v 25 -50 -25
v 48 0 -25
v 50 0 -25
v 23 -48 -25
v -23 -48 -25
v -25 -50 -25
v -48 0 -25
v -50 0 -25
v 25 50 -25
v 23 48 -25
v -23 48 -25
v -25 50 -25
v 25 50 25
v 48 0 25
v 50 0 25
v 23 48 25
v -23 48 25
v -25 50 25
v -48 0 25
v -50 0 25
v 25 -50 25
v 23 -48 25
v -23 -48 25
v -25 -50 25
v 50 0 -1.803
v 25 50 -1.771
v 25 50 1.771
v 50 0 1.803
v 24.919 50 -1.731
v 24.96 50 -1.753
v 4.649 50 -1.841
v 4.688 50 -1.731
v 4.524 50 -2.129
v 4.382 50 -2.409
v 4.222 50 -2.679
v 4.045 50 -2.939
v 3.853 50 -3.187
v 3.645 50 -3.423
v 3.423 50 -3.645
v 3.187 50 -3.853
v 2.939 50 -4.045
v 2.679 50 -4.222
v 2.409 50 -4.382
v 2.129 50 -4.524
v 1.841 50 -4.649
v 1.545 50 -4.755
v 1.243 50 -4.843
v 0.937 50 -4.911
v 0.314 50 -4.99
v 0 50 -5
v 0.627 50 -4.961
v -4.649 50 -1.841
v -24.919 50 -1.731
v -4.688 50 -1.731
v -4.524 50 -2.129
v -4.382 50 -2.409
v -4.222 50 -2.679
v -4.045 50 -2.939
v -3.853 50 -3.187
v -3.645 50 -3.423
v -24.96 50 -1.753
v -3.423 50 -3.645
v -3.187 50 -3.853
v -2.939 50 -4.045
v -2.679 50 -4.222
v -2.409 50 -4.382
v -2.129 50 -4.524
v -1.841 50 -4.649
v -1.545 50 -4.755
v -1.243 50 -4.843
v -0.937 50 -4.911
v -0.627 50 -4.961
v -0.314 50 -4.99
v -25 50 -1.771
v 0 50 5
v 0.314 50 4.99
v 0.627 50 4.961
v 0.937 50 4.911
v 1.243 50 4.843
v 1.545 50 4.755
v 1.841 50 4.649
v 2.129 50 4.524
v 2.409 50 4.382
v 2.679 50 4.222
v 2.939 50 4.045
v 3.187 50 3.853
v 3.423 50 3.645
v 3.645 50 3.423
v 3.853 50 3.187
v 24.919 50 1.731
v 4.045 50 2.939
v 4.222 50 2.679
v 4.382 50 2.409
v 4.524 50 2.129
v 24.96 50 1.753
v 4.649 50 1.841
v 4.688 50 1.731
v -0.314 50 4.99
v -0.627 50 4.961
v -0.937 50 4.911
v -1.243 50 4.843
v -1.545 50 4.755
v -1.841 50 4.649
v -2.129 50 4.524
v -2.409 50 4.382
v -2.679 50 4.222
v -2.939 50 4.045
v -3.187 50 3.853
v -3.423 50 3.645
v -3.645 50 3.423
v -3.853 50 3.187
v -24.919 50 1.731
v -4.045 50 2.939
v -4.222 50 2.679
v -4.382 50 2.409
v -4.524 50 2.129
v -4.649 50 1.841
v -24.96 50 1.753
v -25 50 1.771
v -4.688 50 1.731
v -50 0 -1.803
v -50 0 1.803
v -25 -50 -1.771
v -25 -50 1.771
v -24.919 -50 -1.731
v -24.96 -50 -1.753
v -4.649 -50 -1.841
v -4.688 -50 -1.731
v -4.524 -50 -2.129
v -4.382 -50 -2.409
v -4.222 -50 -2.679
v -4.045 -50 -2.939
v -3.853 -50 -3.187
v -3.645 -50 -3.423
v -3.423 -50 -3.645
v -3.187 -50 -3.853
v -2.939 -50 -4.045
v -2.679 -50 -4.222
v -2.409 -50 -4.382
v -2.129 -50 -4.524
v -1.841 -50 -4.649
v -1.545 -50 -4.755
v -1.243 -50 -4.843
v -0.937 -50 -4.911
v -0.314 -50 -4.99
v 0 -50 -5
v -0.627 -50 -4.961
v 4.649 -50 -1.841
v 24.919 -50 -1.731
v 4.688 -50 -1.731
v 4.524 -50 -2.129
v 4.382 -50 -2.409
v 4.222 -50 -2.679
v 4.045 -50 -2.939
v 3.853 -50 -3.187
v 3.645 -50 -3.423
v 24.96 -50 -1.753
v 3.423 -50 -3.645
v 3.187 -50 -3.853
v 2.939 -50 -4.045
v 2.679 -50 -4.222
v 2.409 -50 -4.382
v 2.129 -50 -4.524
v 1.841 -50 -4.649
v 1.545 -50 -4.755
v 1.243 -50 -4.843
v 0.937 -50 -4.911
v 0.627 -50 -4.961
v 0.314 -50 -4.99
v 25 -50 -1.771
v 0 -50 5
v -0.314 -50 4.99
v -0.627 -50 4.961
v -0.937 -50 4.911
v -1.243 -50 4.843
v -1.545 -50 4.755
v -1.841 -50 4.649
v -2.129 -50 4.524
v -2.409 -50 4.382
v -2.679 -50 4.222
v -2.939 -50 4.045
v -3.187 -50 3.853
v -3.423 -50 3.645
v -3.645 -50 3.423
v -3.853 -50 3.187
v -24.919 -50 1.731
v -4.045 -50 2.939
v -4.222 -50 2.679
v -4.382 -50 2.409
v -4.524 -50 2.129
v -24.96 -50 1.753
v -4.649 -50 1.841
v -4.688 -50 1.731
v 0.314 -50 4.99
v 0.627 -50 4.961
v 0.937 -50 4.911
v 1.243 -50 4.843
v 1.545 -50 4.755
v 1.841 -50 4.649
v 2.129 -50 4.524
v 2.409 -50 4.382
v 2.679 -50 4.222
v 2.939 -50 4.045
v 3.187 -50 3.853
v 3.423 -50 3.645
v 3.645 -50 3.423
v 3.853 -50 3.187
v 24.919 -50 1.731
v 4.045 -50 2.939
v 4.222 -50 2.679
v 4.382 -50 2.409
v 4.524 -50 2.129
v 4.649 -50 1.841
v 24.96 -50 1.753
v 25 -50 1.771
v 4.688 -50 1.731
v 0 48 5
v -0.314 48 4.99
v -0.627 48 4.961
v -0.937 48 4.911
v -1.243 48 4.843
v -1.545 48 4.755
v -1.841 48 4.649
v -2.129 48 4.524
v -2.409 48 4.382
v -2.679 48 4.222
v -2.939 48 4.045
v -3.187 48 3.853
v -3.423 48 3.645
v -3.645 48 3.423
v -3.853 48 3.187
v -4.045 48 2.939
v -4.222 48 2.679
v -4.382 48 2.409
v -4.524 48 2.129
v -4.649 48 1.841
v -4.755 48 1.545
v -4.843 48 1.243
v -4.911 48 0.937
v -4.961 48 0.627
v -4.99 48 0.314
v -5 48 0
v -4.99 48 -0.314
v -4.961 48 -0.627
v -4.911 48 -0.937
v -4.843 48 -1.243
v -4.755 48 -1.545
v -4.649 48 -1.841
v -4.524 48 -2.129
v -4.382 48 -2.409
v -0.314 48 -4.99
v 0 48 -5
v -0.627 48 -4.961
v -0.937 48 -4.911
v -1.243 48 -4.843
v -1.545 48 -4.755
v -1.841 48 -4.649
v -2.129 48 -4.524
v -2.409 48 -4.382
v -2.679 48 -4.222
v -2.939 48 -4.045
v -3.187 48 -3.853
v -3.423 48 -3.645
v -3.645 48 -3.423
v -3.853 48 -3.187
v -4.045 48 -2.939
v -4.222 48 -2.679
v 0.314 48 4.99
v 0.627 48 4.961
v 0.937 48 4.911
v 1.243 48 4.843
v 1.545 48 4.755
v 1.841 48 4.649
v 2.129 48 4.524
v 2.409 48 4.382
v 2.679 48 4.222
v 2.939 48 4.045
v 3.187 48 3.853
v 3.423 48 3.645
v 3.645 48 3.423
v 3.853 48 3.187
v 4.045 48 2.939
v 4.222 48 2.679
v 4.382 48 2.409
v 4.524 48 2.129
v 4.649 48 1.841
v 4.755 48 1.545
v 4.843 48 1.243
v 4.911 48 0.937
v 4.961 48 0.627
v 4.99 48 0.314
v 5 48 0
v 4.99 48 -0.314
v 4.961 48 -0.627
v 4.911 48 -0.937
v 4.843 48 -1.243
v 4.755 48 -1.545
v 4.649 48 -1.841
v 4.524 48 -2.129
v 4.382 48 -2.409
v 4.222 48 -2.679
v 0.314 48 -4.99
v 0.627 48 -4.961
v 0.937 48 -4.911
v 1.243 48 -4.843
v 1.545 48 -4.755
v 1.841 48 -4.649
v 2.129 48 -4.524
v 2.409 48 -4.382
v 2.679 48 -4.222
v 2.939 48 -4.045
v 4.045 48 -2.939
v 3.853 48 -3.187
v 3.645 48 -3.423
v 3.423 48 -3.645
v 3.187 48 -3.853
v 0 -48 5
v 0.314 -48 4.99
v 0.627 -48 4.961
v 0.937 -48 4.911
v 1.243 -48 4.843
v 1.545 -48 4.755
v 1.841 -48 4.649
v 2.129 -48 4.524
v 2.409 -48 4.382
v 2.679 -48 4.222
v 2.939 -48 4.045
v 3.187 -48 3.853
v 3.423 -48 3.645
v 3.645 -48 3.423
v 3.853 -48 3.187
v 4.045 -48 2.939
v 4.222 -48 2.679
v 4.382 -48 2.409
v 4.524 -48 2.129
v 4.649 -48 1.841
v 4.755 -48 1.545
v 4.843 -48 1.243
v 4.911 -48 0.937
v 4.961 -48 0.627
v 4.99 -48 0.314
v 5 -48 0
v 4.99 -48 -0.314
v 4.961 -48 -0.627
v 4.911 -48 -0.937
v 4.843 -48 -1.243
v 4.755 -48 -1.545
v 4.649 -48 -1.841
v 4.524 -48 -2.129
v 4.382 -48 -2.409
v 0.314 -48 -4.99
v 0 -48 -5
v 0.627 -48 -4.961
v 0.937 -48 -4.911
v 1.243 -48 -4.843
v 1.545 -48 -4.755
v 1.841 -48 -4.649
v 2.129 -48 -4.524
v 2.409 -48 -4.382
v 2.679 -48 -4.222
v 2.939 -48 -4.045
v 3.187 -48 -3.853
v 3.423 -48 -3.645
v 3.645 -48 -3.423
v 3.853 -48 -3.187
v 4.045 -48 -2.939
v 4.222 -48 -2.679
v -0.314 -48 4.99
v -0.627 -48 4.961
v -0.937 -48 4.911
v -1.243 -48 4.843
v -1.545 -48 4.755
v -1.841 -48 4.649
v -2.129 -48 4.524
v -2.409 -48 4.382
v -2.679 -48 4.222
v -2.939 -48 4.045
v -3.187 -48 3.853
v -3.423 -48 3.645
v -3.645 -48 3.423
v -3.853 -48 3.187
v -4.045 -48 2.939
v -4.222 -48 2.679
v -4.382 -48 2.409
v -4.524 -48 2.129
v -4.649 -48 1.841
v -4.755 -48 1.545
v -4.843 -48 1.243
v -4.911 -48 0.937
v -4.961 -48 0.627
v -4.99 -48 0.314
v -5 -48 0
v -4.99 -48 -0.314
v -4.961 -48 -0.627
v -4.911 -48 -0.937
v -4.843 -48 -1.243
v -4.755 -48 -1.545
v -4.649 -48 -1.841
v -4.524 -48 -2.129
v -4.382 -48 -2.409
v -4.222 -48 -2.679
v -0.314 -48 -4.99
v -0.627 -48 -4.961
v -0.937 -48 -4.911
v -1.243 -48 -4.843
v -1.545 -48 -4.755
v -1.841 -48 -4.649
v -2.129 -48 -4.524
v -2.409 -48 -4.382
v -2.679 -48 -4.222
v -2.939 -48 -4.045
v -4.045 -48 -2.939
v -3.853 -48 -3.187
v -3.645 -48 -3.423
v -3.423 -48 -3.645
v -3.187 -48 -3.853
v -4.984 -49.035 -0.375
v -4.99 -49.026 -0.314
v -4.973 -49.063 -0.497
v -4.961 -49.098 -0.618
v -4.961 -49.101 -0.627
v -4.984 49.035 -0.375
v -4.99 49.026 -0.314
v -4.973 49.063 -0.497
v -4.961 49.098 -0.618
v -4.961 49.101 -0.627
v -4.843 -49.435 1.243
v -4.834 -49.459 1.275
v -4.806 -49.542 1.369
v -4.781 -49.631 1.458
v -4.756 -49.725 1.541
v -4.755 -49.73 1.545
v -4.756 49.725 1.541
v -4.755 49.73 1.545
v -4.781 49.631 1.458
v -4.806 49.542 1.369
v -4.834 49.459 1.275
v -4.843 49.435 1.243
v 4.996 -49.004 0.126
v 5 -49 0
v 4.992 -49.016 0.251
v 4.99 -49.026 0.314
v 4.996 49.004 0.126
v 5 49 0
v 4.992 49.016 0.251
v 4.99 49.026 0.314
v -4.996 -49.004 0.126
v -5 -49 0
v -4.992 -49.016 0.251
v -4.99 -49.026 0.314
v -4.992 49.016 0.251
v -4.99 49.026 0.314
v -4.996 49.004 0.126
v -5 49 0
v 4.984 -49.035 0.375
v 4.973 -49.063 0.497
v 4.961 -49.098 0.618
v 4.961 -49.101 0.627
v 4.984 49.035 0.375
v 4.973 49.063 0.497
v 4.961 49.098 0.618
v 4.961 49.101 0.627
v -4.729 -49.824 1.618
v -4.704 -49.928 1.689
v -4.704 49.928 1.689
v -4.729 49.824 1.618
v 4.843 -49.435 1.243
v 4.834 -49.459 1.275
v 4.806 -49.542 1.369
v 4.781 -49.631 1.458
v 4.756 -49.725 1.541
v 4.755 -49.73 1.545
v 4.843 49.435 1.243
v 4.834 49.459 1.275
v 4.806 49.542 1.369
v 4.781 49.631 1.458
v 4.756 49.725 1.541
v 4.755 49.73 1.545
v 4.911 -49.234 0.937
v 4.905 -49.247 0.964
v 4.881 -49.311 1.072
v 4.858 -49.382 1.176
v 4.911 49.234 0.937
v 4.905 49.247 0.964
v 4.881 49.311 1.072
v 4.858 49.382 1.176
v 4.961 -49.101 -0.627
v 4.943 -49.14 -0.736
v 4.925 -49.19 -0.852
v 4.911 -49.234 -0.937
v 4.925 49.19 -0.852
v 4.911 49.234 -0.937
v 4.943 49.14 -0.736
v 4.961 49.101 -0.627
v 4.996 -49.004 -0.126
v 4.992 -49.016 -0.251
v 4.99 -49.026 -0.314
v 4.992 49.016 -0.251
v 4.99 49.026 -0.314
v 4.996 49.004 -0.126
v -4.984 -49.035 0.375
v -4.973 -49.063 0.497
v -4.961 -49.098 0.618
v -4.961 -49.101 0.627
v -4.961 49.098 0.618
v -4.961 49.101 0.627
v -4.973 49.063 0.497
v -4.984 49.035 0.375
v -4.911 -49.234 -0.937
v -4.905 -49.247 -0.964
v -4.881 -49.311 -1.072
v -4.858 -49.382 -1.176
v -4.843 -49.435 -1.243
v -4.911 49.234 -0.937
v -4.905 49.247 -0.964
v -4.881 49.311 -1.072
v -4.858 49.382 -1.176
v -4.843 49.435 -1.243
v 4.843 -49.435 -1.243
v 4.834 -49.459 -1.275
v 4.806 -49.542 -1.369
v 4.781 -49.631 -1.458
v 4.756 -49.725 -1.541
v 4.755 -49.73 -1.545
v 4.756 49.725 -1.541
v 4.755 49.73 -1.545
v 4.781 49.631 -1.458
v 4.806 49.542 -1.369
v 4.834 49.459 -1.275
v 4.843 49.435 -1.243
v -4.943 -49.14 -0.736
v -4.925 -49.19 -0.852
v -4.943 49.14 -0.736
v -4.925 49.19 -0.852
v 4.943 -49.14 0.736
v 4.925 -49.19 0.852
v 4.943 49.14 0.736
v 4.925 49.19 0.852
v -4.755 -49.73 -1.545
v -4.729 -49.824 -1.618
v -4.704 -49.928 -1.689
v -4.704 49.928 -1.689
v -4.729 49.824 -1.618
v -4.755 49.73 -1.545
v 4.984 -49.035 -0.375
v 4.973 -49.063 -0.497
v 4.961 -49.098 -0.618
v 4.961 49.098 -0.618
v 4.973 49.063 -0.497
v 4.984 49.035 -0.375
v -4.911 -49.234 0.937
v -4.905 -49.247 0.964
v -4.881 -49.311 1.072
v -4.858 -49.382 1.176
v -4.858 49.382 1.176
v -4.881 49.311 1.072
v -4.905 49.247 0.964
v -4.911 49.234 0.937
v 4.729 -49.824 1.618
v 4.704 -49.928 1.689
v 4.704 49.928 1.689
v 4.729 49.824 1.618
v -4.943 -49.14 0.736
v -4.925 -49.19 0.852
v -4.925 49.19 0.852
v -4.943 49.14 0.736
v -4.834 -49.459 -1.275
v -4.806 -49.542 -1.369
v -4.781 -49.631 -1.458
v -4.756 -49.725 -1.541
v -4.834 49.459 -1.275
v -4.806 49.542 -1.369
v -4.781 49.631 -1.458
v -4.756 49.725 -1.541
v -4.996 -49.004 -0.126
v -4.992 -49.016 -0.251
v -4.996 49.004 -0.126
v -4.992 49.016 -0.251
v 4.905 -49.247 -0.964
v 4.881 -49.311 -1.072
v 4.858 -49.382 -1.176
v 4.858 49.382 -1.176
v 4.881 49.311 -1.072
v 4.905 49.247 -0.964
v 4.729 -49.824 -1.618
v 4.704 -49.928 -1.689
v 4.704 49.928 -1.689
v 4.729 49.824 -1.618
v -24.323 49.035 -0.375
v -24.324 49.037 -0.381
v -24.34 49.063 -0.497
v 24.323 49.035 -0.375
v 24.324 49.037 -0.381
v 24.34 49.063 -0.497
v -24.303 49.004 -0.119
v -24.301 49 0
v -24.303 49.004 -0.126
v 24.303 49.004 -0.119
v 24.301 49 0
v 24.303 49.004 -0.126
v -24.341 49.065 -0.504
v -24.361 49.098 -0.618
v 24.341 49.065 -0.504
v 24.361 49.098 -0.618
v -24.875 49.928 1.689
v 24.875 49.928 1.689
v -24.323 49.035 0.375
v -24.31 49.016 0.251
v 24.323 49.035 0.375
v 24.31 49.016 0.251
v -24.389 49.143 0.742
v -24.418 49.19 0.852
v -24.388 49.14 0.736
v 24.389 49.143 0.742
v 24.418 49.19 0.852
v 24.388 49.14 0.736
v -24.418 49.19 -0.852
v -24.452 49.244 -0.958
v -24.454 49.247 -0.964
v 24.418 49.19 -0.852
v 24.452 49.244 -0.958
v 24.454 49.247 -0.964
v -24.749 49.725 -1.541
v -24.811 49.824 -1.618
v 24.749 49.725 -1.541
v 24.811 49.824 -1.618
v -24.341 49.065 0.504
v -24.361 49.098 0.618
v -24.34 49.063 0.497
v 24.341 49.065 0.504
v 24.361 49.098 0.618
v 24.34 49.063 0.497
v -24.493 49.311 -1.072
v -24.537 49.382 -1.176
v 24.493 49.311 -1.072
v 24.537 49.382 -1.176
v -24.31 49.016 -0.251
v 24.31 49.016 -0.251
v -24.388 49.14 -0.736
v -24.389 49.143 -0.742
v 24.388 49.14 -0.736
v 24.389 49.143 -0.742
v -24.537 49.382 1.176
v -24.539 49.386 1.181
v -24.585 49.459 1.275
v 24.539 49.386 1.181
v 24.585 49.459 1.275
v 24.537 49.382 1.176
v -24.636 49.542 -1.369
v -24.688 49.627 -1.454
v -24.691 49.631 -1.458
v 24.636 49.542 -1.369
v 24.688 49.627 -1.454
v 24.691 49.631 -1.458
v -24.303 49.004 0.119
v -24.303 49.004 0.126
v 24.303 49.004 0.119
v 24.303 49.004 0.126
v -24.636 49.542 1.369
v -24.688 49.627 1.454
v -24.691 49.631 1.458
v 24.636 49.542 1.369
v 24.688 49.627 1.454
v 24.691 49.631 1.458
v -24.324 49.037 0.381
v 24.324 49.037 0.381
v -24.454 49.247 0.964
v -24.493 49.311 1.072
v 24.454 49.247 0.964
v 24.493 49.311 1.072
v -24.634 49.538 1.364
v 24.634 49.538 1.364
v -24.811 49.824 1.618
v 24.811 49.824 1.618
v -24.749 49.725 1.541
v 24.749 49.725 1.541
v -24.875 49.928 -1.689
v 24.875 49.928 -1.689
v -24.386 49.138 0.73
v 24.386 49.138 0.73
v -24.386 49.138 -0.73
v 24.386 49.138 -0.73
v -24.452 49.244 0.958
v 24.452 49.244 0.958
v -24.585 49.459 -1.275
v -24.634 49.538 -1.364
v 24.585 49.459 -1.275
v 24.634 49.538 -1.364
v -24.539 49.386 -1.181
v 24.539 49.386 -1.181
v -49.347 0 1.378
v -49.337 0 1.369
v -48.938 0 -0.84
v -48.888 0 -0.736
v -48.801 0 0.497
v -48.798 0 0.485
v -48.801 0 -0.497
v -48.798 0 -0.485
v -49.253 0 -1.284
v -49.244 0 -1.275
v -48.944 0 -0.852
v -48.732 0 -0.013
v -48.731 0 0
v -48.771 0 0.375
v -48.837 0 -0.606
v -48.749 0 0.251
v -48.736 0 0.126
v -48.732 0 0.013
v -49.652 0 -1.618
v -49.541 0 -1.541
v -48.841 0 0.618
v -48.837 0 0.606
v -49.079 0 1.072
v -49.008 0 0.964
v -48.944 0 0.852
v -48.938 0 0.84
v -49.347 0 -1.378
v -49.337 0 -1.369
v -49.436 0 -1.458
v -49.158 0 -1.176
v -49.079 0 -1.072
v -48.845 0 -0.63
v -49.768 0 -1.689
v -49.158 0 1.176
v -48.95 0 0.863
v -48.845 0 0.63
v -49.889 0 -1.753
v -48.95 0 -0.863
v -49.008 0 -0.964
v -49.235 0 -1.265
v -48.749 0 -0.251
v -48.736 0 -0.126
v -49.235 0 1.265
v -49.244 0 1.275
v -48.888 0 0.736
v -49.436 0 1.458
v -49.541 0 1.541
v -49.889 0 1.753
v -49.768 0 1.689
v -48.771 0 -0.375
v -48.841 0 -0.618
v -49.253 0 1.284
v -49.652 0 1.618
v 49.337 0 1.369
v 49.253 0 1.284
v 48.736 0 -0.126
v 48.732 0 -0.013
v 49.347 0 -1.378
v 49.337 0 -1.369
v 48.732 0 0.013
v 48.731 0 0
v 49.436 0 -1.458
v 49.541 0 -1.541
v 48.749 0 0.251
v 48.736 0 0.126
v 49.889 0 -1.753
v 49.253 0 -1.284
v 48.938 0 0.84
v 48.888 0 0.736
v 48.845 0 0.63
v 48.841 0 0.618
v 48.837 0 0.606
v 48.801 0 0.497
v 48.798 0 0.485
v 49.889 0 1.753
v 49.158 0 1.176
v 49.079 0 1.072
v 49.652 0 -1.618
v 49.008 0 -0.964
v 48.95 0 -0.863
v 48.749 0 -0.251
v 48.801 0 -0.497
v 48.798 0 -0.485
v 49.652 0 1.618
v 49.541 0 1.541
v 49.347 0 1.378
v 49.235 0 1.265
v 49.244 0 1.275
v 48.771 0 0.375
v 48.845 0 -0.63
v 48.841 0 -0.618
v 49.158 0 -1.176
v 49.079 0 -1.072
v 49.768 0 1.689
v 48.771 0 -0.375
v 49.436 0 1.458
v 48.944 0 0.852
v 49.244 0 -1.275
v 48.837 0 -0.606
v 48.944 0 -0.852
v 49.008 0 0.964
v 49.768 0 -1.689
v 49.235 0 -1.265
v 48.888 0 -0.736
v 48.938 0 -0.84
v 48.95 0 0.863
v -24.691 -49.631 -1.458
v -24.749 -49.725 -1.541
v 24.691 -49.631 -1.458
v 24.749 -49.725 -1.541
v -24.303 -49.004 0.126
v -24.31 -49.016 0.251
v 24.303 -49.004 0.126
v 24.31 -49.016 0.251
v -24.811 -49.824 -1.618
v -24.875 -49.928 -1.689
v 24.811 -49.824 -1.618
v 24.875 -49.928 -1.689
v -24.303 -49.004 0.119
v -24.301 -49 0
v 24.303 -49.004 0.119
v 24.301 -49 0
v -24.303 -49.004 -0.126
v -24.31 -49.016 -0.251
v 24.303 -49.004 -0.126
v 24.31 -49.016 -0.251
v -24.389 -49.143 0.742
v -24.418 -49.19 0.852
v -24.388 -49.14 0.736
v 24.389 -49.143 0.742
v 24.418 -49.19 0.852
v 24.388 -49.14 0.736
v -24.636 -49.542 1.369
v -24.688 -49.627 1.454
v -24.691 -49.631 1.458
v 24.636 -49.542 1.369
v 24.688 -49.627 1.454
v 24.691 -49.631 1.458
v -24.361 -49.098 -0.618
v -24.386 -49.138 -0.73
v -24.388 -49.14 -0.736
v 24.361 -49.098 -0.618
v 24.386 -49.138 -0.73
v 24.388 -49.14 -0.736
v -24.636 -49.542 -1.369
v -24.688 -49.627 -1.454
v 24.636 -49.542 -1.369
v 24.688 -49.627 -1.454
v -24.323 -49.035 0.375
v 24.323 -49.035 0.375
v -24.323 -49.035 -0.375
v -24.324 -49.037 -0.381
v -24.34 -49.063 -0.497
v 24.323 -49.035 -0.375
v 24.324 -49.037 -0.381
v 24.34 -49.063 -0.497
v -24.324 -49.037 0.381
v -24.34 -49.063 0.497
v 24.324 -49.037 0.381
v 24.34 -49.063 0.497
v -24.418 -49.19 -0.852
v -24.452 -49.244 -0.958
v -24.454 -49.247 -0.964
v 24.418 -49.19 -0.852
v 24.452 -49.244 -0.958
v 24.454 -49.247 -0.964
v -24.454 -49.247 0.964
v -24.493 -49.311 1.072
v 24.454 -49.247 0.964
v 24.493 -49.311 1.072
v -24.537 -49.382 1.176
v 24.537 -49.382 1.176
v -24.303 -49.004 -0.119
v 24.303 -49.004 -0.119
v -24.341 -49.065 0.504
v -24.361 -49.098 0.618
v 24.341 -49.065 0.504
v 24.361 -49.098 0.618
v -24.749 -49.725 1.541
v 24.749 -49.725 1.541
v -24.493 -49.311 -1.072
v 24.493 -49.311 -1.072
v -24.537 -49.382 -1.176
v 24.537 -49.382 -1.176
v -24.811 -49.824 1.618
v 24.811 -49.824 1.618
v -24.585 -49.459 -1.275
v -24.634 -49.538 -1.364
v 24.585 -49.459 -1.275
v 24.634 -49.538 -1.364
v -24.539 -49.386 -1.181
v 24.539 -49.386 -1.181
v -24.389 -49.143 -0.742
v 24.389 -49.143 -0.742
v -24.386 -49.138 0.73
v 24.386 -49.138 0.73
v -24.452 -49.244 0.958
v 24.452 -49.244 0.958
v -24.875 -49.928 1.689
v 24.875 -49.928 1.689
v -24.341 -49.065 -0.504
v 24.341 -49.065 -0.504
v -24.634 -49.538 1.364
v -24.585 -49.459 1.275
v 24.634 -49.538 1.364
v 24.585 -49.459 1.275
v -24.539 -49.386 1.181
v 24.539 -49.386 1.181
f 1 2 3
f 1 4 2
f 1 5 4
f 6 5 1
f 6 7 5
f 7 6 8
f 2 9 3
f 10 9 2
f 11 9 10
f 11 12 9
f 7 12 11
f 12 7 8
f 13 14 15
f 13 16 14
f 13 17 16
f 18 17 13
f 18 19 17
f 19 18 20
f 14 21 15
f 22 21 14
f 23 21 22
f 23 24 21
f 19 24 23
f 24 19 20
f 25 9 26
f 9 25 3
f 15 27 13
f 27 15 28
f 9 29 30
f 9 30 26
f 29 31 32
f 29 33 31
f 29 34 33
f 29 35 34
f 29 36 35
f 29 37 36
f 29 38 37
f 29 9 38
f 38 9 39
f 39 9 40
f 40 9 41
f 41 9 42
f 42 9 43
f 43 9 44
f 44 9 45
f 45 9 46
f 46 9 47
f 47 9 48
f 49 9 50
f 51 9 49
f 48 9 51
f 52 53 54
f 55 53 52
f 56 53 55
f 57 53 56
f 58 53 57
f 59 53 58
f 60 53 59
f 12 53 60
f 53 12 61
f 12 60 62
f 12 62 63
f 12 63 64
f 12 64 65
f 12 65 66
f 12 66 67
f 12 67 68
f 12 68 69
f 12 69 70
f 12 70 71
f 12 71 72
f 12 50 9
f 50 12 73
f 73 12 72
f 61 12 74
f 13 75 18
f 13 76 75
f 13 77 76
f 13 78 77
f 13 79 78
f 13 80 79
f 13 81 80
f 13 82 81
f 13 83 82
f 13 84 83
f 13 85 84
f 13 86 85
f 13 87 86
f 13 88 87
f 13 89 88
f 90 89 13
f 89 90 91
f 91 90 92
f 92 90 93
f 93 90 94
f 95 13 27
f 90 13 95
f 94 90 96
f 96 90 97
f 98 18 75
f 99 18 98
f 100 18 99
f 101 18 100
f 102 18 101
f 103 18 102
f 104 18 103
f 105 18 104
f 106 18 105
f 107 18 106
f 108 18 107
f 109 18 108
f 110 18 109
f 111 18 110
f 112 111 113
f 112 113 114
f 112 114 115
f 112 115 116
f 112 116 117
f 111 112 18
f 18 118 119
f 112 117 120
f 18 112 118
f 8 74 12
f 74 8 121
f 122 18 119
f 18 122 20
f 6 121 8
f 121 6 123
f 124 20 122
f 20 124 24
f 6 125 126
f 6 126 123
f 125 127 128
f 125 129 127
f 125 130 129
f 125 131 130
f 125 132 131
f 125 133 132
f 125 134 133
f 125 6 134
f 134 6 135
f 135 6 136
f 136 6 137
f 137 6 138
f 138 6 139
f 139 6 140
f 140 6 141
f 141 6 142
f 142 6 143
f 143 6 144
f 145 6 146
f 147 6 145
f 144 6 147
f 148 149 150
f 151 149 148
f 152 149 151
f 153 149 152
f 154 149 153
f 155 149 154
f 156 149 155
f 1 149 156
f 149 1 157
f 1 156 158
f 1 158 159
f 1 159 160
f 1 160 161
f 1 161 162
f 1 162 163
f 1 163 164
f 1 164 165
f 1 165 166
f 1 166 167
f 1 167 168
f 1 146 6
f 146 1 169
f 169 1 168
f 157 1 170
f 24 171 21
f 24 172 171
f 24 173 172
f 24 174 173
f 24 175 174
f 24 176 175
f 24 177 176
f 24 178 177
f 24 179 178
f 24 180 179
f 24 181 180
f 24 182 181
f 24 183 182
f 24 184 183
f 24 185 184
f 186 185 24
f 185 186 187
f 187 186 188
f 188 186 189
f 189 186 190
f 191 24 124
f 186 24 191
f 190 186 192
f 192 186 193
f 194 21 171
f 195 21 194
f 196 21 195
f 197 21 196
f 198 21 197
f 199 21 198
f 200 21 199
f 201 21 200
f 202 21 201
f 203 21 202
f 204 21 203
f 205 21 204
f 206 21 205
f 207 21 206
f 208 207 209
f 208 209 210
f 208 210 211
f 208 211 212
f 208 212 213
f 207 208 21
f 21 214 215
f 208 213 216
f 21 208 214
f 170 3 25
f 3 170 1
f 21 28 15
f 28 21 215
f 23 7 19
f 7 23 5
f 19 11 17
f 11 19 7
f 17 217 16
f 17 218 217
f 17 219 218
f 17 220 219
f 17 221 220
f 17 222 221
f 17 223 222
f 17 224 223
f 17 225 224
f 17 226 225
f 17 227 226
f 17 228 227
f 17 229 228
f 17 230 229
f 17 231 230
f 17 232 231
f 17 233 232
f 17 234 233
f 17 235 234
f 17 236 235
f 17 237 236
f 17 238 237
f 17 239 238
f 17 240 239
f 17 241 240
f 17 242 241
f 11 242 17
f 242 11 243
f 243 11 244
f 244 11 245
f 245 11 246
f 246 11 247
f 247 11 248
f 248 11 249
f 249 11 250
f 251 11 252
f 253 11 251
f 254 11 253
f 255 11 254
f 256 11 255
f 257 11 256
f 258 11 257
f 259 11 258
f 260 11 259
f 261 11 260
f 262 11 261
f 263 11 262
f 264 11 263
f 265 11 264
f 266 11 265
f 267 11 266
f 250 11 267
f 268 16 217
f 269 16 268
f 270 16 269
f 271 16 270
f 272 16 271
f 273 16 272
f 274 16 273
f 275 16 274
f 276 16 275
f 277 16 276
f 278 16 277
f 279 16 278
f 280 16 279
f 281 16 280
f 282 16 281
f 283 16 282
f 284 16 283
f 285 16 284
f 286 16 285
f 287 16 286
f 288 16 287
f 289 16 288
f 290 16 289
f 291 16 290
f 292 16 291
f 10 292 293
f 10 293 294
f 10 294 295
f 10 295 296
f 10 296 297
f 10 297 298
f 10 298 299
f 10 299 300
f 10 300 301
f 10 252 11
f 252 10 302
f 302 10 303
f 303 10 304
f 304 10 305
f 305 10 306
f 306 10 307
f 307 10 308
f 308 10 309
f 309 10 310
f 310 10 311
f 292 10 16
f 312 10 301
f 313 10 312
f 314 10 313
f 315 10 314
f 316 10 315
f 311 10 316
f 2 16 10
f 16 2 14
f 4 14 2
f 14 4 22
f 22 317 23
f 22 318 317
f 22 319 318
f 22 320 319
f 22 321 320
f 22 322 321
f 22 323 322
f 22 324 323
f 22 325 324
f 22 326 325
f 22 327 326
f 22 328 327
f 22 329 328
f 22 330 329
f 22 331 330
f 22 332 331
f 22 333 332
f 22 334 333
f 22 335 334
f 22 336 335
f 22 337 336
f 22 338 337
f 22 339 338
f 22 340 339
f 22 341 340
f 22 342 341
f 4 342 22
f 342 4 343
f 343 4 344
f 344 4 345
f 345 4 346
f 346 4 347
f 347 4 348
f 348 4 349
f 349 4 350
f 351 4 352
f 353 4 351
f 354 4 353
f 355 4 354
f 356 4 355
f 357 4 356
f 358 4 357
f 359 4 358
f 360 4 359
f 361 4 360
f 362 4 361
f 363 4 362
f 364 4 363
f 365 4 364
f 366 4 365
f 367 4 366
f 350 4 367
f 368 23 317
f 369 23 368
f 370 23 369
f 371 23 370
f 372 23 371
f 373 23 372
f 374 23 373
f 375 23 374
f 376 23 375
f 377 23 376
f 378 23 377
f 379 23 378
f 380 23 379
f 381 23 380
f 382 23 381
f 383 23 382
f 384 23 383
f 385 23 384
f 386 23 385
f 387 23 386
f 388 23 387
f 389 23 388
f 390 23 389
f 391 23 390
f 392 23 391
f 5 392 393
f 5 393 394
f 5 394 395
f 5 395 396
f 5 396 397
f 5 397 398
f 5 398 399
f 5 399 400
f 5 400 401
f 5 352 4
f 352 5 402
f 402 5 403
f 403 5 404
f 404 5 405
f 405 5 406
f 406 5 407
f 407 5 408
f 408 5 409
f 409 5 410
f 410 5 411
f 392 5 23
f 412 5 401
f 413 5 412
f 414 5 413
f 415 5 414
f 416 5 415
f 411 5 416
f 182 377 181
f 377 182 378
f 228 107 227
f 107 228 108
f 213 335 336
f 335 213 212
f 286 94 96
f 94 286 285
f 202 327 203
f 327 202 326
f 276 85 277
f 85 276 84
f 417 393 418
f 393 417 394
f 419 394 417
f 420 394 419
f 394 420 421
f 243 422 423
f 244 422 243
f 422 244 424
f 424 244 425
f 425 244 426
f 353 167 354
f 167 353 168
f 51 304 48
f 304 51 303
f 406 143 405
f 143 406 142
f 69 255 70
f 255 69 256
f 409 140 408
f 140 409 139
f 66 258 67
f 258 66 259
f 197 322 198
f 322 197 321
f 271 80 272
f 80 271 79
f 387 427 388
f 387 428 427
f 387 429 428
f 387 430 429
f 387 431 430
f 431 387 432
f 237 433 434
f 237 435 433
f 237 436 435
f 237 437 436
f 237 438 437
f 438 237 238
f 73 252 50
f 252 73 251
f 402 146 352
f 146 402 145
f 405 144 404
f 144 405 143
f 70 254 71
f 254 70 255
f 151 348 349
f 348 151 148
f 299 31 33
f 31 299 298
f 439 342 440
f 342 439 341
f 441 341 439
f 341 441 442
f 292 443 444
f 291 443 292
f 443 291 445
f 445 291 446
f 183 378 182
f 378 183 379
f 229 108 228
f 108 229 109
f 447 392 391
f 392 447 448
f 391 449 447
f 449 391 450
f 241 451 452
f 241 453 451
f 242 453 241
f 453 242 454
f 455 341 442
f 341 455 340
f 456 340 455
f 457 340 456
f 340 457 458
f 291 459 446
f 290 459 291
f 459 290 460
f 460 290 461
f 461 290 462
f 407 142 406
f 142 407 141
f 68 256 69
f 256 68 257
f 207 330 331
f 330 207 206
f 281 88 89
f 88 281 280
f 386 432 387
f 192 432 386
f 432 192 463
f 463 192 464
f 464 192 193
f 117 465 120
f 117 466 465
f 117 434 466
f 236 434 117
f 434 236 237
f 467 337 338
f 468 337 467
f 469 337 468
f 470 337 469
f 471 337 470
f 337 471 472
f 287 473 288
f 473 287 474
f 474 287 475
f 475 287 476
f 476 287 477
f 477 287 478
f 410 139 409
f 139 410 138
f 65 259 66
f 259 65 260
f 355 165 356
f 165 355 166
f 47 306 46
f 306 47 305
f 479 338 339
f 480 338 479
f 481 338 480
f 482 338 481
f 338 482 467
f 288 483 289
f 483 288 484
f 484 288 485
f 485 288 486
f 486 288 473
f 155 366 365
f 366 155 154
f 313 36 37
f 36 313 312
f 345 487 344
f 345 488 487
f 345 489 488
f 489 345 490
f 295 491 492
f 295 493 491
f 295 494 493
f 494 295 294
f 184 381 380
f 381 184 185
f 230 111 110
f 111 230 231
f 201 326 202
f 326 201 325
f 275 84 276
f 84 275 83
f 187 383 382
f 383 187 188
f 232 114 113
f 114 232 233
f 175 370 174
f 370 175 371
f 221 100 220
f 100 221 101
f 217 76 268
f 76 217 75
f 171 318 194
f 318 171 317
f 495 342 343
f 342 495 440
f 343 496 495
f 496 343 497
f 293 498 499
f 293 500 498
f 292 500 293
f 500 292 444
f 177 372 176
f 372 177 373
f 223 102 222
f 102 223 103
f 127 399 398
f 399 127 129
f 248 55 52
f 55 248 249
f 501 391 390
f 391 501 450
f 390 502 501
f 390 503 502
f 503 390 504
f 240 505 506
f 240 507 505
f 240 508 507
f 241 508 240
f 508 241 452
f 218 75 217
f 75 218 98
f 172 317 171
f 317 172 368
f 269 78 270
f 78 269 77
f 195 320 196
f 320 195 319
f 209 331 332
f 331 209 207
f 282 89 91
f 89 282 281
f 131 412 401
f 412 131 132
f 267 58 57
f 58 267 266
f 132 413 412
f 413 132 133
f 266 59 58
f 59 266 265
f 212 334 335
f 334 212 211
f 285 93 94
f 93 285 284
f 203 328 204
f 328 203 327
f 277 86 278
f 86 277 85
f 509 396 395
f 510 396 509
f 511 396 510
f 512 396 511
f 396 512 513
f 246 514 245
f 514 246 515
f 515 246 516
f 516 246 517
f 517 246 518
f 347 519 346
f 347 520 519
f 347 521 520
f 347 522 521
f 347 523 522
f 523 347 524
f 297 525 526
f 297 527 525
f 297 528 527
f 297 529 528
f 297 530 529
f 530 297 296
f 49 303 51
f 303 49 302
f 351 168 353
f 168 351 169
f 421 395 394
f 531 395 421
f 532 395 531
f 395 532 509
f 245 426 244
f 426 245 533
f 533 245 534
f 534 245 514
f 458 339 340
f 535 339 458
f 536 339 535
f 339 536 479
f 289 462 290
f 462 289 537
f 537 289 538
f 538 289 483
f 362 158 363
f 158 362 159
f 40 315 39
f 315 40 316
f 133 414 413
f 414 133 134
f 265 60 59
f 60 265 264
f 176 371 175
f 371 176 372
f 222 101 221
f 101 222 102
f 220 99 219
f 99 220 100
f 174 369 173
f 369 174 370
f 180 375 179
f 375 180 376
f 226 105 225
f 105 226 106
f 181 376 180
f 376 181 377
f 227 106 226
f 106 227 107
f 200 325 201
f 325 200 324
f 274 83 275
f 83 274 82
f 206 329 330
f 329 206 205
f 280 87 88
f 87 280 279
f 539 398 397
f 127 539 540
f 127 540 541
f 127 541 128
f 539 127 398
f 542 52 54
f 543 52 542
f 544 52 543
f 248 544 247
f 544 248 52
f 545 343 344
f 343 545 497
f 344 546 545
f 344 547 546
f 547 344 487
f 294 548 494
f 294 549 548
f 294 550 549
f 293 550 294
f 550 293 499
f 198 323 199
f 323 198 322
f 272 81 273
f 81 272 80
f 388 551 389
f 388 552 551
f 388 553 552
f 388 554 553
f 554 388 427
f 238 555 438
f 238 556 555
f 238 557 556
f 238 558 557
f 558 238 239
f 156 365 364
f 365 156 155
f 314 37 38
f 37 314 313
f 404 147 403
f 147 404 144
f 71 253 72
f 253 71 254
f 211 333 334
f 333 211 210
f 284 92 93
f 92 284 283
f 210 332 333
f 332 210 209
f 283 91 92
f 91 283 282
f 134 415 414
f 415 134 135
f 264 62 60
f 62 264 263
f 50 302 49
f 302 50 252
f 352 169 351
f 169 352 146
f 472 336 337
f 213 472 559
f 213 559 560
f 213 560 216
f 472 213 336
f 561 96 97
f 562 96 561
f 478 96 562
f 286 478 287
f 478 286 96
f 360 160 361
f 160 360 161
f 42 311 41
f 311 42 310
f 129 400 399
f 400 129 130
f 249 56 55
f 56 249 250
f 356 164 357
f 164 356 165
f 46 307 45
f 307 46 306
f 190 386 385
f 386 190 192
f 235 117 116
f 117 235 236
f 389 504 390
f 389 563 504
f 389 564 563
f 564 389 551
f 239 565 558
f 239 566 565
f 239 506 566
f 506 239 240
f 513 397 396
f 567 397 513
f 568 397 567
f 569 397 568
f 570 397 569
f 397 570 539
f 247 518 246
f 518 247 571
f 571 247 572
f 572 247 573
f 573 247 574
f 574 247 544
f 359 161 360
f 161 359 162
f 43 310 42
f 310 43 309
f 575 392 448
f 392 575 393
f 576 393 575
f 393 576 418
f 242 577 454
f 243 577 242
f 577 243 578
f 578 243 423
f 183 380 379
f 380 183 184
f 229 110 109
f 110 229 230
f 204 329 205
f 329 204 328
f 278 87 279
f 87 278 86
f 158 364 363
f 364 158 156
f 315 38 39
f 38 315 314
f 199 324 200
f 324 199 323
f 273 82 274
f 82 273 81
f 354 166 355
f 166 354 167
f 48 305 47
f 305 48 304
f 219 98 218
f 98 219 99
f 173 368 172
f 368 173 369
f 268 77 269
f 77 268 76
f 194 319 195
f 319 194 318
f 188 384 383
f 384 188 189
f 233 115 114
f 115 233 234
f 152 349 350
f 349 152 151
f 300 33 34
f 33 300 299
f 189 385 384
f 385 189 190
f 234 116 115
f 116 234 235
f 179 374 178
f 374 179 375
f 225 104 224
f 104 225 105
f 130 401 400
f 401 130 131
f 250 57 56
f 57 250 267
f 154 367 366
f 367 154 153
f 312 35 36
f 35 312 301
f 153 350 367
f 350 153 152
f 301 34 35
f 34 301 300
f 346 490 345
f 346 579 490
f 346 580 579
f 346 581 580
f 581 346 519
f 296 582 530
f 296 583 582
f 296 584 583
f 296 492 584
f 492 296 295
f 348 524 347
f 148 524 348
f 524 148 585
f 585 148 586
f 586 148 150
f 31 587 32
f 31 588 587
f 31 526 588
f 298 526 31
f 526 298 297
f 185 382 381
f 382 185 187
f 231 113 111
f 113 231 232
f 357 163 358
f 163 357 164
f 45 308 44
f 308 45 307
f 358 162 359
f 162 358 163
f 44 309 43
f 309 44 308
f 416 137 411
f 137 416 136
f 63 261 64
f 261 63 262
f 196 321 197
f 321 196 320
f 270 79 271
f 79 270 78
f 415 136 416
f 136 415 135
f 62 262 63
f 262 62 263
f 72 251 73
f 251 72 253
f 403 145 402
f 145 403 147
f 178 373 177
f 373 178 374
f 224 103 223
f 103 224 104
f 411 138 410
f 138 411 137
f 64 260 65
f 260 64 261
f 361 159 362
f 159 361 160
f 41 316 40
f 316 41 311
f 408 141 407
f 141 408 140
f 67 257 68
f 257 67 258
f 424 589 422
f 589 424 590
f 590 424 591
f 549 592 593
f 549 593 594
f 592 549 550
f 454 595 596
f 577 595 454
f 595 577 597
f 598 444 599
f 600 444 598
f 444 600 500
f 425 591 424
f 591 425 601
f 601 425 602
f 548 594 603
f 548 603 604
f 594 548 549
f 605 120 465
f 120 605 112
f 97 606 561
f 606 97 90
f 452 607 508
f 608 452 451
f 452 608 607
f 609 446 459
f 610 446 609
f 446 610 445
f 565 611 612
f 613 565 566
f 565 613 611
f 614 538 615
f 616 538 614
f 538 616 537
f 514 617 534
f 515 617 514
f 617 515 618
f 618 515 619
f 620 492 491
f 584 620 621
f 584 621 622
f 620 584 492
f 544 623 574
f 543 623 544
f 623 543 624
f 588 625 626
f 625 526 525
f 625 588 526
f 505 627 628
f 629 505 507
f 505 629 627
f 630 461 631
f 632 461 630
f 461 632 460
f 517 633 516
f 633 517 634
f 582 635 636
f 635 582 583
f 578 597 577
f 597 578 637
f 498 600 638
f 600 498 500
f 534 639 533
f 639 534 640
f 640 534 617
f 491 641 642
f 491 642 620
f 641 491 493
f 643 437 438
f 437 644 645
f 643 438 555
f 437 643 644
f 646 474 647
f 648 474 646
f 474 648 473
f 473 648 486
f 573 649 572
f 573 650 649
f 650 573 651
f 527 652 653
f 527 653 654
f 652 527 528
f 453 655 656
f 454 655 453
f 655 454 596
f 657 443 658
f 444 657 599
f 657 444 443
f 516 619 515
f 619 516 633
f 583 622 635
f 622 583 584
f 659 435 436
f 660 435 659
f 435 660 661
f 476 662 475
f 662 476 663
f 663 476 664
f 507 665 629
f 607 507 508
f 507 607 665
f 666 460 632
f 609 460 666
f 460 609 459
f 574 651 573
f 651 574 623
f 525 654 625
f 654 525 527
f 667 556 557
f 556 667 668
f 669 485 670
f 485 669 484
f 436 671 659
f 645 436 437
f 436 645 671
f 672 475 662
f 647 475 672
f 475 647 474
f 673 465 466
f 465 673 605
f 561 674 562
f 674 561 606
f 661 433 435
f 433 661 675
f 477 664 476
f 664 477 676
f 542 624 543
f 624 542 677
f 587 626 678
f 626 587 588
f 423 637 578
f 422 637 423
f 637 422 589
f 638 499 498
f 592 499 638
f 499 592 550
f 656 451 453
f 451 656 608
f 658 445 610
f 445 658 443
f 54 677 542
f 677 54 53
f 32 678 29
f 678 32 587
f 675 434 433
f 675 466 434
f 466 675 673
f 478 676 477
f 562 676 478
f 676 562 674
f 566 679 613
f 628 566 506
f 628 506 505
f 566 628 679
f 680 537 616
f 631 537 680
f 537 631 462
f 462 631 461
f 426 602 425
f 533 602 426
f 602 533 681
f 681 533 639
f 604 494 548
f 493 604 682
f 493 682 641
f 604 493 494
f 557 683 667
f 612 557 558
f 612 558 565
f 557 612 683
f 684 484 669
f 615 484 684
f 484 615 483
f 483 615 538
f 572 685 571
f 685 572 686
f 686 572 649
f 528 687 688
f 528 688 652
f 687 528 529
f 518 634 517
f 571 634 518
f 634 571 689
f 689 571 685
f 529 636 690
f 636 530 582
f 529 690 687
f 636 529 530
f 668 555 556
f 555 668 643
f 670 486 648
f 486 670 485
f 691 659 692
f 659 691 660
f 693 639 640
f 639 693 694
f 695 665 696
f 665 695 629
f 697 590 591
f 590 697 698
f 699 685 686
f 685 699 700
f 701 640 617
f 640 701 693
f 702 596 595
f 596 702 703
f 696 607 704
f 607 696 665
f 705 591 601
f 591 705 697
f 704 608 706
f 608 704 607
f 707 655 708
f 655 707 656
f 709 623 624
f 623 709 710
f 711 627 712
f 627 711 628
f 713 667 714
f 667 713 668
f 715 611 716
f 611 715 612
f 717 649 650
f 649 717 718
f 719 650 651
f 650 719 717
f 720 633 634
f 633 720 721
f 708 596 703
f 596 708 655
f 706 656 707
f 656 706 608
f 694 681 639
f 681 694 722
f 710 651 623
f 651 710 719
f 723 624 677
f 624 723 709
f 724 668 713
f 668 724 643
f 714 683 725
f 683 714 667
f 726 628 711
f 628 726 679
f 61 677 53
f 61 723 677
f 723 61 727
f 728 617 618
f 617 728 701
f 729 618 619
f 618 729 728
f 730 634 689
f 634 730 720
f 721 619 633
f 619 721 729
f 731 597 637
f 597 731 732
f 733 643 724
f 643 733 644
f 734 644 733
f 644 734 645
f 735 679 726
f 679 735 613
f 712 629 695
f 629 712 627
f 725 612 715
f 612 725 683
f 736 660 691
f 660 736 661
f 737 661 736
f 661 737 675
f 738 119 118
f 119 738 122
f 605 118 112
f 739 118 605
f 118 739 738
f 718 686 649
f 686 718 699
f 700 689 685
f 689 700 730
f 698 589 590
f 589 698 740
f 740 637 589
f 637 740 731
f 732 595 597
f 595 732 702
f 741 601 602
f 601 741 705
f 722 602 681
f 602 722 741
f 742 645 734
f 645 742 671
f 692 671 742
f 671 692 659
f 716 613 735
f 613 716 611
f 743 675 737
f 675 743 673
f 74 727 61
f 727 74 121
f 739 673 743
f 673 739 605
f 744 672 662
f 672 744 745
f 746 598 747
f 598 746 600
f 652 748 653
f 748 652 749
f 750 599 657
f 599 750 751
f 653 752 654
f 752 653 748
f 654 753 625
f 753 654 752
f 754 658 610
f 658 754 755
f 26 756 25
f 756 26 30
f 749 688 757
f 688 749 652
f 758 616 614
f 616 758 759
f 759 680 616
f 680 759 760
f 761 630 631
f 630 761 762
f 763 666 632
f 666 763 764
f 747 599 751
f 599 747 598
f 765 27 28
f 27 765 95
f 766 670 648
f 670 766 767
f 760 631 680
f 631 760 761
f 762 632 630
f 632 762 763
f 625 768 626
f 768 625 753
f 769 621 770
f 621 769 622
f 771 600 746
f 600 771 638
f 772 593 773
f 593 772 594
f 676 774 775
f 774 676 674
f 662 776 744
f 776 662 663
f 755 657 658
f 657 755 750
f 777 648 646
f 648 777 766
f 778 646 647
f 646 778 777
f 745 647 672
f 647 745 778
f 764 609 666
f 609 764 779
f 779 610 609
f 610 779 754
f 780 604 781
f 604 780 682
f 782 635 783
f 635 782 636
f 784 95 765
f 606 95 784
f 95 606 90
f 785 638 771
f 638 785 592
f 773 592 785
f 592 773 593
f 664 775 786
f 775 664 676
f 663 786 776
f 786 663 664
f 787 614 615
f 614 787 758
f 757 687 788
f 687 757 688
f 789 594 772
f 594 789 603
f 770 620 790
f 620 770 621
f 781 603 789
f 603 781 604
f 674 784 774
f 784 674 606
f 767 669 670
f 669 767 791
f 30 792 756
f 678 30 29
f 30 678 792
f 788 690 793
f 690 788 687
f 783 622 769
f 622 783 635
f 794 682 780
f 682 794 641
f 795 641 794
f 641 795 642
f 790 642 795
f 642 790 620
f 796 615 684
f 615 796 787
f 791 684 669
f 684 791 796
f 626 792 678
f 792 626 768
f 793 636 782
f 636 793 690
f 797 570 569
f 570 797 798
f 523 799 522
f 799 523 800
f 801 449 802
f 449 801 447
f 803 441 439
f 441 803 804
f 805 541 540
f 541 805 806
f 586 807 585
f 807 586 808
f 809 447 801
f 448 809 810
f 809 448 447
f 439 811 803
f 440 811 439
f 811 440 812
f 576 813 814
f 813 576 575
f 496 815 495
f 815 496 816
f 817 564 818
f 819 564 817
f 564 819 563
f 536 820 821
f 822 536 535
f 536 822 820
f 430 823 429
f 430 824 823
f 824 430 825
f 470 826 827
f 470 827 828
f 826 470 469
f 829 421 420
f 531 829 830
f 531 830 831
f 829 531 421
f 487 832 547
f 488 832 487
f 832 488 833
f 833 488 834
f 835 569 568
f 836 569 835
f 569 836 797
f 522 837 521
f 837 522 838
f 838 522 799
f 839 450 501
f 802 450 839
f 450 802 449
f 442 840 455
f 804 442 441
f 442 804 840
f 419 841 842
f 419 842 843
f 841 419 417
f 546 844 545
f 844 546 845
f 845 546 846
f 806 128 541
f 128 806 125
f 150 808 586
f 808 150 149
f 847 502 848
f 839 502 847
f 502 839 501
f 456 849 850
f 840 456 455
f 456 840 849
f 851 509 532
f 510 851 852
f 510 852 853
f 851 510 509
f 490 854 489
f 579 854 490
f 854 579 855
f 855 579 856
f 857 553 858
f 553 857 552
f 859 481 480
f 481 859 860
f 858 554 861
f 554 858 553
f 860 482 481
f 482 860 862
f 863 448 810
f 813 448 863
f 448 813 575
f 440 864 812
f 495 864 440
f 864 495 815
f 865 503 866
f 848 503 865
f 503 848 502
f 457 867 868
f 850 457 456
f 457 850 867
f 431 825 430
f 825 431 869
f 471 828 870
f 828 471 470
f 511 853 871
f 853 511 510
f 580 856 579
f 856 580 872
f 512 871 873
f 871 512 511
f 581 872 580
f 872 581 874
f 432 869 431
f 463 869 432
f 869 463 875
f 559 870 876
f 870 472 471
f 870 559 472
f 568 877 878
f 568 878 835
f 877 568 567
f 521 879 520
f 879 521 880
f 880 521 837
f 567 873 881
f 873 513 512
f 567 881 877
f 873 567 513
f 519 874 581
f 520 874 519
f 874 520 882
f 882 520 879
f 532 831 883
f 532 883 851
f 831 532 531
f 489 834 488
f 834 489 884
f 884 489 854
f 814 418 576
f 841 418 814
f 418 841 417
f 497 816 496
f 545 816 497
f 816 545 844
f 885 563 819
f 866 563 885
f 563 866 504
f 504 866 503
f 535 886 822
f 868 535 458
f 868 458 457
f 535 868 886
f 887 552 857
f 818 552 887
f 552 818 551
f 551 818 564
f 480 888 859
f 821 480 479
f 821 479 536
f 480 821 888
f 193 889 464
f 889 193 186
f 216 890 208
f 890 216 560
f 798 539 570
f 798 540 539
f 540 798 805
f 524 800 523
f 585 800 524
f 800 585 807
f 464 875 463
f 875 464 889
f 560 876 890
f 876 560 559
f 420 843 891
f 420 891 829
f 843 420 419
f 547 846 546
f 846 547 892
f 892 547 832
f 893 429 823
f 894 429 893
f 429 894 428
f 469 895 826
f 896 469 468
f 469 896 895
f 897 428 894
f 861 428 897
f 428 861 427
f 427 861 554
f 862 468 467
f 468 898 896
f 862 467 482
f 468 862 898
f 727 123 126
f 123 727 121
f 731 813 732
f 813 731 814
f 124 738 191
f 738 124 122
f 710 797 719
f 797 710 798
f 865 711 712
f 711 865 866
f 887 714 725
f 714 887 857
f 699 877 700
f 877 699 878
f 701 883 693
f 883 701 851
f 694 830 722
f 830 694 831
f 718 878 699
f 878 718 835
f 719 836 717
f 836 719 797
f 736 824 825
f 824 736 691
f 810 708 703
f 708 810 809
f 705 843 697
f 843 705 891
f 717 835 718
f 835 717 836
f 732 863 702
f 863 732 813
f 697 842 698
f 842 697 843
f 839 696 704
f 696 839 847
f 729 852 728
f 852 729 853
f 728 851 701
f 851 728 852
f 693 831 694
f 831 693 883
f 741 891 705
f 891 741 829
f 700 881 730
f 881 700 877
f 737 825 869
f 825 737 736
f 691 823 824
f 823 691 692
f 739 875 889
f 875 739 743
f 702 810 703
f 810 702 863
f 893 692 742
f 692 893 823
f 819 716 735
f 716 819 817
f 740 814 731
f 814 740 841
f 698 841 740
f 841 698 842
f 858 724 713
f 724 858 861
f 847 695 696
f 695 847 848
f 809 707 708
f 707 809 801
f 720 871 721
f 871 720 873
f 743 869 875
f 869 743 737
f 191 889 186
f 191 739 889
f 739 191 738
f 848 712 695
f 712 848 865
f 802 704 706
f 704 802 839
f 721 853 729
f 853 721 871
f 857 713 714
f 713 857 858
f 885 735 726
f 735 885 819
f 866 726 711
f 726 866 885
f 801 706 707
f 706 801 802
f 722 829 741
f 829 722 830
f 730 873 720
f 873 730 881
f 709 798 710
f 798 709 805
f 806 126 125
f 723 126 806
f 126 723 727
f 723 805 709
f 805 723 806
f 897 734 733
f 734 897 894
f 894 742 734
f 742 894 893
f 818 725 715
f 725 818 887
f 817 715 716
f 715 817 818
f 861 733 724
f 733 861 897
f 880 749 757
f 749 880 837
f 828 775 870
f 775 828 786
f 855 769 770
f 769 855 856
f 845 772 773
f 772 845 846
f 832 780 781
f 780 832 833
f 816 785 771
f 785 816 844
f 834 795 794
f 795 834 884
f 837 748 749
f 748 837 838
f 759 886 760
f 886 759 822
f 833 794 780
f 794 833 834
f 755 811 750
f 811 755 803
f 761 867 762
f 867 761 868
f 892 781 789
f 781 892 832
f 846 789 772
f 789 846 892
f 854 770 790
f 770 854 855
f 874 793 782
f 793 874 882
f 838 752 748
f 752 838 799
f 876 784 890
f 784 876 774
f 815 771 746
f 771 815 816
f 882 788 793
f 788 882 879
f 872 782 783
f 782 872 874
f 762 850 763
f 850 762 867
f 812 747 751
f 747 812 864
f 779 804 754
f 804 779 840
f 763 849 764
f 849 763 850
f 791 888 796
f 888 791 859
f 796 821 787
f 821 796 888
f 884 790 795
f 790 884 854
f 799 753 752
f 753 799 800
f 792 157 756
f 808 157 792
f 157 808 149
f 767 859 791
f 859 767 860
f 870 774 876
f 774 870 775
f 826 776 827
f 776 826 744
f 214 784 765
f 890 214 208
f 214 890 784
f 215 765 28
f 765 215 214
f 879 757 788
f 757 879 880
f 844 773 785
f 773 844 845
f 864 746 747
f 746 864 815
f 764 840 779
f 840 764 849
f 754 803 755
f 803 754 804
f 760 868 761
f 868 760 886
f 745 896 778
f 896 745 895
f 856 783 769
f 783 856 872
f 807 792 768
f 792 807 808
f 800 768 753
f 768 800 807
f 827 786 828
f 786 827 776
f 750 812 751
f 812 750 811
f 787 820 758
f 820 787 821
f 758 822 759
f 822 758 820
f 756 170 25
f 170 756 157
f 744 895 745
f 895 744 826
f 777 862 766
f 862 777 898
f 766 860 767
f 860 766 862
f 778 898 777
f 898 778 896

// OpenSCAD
hex_points = [[-50,0],[-25,50],[25,50],[50,0],[25,-50],[-25,-50]];
interior_hex_points = [[-48,0],[-23,48],[23,48],[48,0],[23,-48],[-23,-48]];
all_points = concat(hex_points, interior_hex_points);
hex_paths = [[0,1,2,3,4,5], [6,7,8,9,10,11]];

difference(){
  linear_extrude(height = 50, center = true, convexity = 10, twist = 0){
    polygon(all_points,hex_paths, 10);
  }

  rotate([90, 0, 0]){
    cylinder(h=102, r=5, center=true, $fn=100);
  }

  translate([0, 51, 0]){
    rotate([0, 90, 0]){
      cylinder(h=52, r=2, center=true, $fn=100);
    }
  }

  translate([-39, 24, 0]){
    rotate([0, 90, 63.5]){
      cylinder(h=65, r=2, center=true, $fn=100);
    }
  }

  translate([39, 24, 0]){
    rotate([0, 90, 116.5]){
      cylinder(h=65, r=2, center=true, $fn=100);
    }
  }

  translate([0, -51, 0]){
    rotate([0, 90, 0]){
      cylinder(h=52, r=2, center=true, $fn=100);
    }
  }

  translate([-39, -24, 0]){
    rotate([0, 90, 116.5]){
      cylinder(h=65, r=2, center=true, $fn=100);
    }
  }

  translate([39, -24, 0]){
    rotate([0, 90, 63.5]){
      cylinder(h=65, r=2, center=true, $fn=100);
    }
  }
}
